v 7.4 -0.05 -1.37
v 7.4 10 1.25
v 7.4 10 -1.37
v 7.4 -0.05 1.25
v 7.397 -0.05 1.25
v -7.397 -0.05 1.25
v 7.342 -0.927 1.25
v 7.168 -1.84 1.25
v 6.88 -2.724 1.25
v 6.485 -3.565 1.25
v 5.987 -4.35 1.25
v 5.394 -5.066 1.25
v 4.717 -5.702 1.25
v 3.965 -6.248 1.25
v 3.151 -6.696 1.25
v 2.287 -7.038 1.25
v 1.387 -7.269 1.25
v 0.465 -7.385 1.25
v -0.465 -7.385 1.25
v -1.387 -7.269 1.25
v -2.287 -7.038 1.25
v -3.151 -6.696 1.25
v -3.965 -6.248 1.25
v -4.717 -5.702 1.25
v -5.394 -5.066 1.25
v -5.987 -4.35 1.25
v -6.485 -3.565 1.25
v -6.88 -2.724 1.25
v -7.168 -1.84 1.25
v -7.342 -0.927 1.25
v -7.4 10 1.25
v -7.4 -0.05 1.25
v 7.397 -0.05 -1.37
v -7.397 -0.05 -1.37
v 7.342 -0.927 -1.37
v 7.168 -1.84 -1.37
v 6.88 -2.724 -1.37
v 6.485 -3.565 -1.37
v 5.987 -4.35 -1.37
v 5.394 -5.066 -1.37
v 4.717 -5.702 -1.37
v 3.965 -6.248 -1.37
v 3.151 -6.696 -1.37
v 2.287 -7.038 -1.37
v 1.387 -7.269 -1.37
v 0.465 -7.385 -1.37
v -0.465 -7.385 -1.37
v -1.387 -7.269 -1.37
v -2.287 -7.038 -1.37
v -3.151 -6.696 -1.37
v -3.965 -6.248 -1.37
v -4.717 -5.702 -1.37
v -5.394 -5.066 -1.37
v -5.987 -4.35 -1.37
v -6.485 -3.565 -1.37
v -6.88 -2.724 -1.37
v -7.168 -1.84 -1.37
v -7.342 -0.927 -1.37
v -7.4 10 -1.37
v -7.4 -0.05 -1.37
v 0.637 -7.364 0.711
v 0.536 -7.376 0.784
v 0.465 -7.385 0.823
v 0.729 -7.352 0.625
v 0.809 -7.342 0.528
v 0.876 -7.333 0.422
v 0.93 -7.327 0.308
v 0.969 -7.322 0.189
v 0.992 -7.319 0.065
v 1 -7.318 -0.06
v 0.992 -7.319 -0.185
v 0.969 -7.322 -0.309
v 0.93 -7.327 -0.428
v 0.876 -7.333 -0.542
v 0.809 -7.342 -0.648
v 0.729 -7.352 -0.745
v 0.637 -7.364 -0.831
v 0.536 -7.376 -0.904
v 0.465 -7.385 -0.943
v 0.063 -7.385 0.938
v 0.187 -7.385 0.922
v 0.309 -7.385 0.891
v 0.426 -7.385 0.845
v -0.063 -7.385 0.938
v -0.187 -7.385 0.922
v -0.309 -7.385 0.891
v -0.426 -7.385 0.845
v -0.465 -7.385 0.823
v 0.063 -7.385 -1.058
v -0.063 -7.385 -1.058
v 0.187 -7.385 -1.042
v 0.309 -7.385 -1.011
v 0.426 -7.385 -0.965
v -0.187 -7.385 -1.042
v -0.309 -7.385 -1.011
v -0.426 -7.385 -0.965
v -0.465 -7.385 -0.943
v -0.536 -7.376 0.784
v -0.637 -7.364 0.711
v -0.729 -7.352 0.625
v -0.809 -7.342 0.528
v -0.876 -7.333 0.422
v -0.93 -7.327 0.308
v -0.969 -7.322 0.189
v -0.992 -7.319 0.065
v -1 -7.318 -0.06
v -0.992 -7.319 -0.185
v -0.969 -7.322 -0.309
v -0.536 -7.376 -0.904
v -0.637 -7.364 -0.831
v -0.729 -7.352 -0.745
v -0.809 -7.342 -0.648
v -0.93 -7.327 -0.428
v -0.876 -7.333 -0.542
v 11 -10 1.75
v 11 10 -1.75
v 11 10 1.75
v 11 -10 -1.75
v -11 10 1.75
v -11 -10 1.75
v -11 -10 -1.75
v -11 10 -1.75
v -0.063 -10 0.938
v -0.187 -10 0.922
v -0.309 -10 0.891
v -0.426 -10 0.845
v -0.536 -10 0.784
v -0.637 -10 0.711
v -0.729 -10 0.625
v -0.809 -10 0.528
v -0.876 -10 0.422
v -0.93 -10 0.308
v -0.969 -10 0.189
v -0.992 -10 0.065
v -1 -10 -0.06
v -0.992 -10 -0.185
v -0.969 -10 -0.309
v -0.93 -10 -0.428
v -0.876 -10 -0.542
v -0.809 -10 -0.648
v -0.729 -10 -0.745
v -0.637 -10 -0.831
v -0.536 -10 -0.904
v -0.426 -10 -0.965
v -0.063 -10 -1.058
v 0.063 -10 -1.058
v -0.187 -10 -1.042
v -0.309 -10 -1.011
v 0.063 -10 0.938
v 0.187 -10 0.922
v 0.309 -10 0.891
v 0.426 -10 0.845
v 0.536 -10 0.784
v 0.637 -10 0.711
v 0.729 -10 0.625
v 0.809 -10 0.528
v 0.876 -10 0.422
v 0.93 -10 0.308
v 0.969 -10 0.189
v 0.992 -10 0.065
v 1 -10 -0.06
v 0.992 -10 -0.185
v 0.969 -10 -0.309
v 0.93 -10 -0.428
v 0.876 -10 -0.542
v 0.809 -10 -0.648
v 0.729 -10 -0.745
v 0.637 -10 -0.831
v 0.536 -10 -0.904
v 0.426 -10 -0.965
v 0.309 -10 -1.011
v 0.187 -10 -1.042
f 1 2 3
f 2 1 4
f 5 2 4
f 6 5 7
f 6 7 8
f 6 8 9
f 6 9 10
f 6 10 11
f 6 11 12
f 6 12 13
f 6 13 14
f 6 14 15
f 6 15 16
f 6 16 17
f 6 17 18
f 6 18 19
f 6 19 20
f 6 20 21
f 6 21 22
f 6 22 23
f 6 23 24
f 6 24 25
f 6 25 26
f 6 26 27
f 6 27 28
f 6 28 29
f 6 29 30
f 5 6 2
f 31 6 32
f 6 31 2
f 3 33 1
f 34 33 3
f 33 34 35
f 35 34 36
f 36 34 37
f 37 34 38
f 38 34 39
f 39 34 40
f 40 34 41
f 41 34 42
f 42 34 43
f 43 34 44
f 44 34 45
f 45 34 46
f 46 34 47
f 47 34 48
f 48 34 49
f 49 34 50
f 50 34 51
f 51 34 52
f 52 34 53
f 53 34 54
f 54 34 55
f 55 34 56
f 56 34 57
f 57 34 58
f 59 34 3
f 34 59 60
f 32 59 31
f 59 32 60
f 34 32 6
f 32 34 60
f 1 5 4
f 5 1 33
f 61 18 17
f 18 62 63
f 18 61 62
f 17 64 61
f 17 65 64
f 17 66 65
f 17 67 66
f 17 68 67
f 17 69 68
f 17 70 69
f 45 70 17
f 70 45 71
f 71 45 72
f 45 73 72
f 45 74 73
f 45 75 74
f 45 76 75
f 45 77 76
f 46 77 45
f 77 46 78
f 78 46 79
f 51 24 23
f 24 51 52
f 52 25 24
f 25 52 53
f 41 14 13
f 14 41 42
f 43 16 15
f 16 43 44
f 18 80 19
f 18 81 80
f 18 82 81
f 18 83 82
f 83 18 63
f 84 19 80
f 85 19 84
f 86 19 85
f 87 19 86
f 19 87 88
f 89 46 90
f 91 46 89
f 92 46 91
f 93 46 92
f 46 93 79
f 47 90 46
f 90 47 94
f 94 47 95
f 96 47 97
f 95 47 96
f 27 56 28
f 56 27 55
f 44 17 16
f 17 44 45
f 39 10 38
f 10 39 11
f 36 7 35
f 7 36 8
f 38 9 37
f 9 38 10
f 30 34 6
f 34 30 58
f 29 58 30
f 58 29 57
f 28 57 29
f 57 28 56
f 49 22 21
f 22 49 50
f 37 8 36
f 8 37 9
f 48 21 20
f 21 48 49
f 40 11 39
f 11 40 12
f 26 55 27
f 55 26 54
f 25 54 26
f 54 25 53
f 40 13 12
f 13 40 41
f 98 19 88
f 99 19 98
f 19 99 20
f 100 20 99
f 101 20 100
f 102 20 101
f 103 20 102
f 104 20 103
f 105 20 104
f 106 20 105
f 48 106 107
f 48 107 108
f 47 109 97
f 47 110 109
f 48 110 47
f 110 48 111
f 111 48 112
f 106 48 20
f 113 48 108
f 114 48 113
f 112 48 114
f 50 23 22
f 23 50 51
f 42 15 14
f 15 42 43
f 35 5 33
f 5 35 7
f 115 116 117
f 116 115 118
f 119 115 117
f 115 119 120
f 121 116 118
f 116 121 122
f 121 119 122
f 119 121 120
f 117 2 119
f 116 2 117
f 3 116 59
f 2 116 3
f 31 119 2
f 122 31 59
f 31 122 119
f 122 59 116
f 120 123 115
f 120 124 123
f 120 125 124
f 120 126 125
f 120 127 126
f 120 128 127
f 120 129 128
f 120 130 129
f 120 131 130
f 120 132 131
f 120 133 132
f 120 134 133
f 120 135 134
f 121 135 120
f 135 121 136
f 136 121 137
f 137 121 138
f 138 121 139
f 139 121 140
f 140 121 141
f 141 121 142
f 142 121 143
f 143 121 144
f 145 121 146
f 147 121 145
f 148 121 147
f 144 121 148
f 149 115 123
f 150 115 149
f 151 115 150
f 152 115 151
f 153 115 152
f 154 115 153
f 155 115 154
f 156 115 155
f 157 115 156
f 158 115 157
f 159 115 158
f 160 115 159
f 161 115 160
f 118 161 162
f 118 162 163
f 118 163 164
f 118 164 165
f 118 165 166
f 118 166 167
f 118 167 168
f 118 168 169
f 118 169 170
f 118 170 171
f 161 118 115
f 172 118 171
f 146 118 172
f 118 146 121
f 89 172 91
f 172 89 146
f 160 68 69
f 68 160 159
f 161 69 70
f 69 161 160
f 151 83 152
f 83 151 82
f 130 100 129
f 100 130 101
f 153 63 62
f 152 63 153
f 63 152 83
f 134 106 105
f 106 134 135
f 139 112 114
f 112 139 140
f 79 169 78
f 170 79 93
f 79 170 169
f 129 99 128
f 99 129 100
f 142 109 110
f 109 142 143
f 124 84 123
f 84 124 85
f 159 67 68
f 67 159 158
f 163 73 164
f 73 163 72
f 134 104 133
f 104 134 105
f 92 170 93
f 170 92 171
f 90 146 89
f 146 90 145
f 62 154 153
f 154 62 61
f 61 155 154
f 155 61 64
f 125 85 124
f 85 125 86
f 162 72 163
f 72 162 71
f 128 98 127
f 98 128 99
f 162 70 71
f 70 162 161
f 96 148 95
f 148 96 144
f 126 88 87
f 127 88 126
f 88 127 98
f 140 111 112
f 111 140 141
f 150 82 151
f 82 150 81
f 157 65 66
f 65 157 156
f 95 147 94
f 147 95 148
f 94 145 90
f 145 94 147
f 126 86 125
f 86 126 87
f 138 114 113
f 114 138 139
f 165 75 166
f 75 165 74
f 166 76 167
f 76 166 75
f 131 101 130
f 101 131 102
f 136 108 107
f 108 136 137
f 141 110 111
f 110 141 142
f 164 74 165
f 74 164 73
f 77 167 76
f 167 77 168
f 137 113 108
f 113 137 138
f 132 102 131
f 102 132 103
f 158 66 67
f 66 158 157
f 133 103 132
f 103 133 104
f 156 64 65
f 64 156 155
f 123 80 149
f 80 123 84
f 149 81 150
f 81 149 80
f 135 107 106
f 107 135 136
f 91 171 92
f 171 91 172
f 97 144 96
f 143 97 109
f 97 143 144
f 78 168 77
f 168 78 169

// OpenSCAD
// file: 3d.scad
$fn = 50;

module disc(diameter, height) {
  linear_extrude(height, center = true) { circle(d = diameter); }
}

module rounded_disc(diameter, height, border_radius = 1) {
  assert(height > border_radius * 2,
         "Height must be higher than 2*border_radius");

  minkowski() {
    disc(diameter - border_radius * 2, height - border_radius * 2);
    sphere(border_radius);
  }
}

module half_rounded_disc(diameter, height, border_radius = 1) {
  intersection() {
    rounded_disc(diameter, height * 2, border_radius);
    translate([ -diameter / 2, -diameter / 2, 0 ]) {
      cube([ diameter, diameter, height ]);
    }
  }
}

module half_sphere(diameter) {
  intersection() {
    translate([ 0, 0, diameter / 4 ]) {
      cube([ diameter, diameter, diameter / 2 ], center = true);
    }

    sphere(d = diameter);
  }
}

// half_sphere(10);
half_rounded_disc(diameter = 85, height = 2.1);
// main file
$fn = 50;

use <3d.scad>

$magnet_outer_diameter = 14.74;
$magnet_inner_diameter = 3.78;
$magnet_depth = 2.58;

$magnet_slot_depth = 2.62;     // first print was 2.65
$magnet_slot_diameter = 14.8;  // first print was 14.9
$magnet_wall_width = 0.5;      // first print was 0.7
$magnet_removal_hole_diameter = 2;

module magnet_holder(
    width, height, depth, magnet_slot_diameter = $magnet_slot_diameter,
    magnet_slot_depth = $magnet_slot_depth,
    magnet_wall_width = $magnet_wall_width,
    magnet_removal_hole_diameter = $magnet_removal_hole_diameter) {
  assert(width > magnet_slot_diameter, "Slot must be wider than the magnet.");
  assert(height > magnet_slot_diameter, "Slot must be higher than the magnet.");
  assert(depth > magnet_slot_depth + magnet_wall_width,
         "Slot must be deeper than the magnet + wall.");

  difference() {
    cube([ width, height, depth ], center = true);

    $magnet_z_offset = (depth - magnet_slot_depth) / 2 - magnet_wall_width;

    // The magnet slot
    translate([ 0, 0, $magnet_z_offset ]) {
      magnet_slot(magnet_slot_diameter, magnet_slot_depth, height);
    }

    // Hole to allow removing the magnet
    translate([ 0, 0, $magnet_z_offset ]) {
      rotate([ 90, 0, 0 ]) {
        cylinder(d = magnet_removal_hole_diameter, h = height, center = true);
      }
    }
  }
}

module magnet_slot(diameter, depth, height) {
  union() {
    // The slot where the magnet should pass
    translate([ 0, height / 4, 0 ]) {
      cube([ diameter, height / 2 + 0.1, depth ], center = true);
    }

    // The magnet
    disc(diameter, depth);
  }
}

magnet_holder(22, 20, 3.5);
